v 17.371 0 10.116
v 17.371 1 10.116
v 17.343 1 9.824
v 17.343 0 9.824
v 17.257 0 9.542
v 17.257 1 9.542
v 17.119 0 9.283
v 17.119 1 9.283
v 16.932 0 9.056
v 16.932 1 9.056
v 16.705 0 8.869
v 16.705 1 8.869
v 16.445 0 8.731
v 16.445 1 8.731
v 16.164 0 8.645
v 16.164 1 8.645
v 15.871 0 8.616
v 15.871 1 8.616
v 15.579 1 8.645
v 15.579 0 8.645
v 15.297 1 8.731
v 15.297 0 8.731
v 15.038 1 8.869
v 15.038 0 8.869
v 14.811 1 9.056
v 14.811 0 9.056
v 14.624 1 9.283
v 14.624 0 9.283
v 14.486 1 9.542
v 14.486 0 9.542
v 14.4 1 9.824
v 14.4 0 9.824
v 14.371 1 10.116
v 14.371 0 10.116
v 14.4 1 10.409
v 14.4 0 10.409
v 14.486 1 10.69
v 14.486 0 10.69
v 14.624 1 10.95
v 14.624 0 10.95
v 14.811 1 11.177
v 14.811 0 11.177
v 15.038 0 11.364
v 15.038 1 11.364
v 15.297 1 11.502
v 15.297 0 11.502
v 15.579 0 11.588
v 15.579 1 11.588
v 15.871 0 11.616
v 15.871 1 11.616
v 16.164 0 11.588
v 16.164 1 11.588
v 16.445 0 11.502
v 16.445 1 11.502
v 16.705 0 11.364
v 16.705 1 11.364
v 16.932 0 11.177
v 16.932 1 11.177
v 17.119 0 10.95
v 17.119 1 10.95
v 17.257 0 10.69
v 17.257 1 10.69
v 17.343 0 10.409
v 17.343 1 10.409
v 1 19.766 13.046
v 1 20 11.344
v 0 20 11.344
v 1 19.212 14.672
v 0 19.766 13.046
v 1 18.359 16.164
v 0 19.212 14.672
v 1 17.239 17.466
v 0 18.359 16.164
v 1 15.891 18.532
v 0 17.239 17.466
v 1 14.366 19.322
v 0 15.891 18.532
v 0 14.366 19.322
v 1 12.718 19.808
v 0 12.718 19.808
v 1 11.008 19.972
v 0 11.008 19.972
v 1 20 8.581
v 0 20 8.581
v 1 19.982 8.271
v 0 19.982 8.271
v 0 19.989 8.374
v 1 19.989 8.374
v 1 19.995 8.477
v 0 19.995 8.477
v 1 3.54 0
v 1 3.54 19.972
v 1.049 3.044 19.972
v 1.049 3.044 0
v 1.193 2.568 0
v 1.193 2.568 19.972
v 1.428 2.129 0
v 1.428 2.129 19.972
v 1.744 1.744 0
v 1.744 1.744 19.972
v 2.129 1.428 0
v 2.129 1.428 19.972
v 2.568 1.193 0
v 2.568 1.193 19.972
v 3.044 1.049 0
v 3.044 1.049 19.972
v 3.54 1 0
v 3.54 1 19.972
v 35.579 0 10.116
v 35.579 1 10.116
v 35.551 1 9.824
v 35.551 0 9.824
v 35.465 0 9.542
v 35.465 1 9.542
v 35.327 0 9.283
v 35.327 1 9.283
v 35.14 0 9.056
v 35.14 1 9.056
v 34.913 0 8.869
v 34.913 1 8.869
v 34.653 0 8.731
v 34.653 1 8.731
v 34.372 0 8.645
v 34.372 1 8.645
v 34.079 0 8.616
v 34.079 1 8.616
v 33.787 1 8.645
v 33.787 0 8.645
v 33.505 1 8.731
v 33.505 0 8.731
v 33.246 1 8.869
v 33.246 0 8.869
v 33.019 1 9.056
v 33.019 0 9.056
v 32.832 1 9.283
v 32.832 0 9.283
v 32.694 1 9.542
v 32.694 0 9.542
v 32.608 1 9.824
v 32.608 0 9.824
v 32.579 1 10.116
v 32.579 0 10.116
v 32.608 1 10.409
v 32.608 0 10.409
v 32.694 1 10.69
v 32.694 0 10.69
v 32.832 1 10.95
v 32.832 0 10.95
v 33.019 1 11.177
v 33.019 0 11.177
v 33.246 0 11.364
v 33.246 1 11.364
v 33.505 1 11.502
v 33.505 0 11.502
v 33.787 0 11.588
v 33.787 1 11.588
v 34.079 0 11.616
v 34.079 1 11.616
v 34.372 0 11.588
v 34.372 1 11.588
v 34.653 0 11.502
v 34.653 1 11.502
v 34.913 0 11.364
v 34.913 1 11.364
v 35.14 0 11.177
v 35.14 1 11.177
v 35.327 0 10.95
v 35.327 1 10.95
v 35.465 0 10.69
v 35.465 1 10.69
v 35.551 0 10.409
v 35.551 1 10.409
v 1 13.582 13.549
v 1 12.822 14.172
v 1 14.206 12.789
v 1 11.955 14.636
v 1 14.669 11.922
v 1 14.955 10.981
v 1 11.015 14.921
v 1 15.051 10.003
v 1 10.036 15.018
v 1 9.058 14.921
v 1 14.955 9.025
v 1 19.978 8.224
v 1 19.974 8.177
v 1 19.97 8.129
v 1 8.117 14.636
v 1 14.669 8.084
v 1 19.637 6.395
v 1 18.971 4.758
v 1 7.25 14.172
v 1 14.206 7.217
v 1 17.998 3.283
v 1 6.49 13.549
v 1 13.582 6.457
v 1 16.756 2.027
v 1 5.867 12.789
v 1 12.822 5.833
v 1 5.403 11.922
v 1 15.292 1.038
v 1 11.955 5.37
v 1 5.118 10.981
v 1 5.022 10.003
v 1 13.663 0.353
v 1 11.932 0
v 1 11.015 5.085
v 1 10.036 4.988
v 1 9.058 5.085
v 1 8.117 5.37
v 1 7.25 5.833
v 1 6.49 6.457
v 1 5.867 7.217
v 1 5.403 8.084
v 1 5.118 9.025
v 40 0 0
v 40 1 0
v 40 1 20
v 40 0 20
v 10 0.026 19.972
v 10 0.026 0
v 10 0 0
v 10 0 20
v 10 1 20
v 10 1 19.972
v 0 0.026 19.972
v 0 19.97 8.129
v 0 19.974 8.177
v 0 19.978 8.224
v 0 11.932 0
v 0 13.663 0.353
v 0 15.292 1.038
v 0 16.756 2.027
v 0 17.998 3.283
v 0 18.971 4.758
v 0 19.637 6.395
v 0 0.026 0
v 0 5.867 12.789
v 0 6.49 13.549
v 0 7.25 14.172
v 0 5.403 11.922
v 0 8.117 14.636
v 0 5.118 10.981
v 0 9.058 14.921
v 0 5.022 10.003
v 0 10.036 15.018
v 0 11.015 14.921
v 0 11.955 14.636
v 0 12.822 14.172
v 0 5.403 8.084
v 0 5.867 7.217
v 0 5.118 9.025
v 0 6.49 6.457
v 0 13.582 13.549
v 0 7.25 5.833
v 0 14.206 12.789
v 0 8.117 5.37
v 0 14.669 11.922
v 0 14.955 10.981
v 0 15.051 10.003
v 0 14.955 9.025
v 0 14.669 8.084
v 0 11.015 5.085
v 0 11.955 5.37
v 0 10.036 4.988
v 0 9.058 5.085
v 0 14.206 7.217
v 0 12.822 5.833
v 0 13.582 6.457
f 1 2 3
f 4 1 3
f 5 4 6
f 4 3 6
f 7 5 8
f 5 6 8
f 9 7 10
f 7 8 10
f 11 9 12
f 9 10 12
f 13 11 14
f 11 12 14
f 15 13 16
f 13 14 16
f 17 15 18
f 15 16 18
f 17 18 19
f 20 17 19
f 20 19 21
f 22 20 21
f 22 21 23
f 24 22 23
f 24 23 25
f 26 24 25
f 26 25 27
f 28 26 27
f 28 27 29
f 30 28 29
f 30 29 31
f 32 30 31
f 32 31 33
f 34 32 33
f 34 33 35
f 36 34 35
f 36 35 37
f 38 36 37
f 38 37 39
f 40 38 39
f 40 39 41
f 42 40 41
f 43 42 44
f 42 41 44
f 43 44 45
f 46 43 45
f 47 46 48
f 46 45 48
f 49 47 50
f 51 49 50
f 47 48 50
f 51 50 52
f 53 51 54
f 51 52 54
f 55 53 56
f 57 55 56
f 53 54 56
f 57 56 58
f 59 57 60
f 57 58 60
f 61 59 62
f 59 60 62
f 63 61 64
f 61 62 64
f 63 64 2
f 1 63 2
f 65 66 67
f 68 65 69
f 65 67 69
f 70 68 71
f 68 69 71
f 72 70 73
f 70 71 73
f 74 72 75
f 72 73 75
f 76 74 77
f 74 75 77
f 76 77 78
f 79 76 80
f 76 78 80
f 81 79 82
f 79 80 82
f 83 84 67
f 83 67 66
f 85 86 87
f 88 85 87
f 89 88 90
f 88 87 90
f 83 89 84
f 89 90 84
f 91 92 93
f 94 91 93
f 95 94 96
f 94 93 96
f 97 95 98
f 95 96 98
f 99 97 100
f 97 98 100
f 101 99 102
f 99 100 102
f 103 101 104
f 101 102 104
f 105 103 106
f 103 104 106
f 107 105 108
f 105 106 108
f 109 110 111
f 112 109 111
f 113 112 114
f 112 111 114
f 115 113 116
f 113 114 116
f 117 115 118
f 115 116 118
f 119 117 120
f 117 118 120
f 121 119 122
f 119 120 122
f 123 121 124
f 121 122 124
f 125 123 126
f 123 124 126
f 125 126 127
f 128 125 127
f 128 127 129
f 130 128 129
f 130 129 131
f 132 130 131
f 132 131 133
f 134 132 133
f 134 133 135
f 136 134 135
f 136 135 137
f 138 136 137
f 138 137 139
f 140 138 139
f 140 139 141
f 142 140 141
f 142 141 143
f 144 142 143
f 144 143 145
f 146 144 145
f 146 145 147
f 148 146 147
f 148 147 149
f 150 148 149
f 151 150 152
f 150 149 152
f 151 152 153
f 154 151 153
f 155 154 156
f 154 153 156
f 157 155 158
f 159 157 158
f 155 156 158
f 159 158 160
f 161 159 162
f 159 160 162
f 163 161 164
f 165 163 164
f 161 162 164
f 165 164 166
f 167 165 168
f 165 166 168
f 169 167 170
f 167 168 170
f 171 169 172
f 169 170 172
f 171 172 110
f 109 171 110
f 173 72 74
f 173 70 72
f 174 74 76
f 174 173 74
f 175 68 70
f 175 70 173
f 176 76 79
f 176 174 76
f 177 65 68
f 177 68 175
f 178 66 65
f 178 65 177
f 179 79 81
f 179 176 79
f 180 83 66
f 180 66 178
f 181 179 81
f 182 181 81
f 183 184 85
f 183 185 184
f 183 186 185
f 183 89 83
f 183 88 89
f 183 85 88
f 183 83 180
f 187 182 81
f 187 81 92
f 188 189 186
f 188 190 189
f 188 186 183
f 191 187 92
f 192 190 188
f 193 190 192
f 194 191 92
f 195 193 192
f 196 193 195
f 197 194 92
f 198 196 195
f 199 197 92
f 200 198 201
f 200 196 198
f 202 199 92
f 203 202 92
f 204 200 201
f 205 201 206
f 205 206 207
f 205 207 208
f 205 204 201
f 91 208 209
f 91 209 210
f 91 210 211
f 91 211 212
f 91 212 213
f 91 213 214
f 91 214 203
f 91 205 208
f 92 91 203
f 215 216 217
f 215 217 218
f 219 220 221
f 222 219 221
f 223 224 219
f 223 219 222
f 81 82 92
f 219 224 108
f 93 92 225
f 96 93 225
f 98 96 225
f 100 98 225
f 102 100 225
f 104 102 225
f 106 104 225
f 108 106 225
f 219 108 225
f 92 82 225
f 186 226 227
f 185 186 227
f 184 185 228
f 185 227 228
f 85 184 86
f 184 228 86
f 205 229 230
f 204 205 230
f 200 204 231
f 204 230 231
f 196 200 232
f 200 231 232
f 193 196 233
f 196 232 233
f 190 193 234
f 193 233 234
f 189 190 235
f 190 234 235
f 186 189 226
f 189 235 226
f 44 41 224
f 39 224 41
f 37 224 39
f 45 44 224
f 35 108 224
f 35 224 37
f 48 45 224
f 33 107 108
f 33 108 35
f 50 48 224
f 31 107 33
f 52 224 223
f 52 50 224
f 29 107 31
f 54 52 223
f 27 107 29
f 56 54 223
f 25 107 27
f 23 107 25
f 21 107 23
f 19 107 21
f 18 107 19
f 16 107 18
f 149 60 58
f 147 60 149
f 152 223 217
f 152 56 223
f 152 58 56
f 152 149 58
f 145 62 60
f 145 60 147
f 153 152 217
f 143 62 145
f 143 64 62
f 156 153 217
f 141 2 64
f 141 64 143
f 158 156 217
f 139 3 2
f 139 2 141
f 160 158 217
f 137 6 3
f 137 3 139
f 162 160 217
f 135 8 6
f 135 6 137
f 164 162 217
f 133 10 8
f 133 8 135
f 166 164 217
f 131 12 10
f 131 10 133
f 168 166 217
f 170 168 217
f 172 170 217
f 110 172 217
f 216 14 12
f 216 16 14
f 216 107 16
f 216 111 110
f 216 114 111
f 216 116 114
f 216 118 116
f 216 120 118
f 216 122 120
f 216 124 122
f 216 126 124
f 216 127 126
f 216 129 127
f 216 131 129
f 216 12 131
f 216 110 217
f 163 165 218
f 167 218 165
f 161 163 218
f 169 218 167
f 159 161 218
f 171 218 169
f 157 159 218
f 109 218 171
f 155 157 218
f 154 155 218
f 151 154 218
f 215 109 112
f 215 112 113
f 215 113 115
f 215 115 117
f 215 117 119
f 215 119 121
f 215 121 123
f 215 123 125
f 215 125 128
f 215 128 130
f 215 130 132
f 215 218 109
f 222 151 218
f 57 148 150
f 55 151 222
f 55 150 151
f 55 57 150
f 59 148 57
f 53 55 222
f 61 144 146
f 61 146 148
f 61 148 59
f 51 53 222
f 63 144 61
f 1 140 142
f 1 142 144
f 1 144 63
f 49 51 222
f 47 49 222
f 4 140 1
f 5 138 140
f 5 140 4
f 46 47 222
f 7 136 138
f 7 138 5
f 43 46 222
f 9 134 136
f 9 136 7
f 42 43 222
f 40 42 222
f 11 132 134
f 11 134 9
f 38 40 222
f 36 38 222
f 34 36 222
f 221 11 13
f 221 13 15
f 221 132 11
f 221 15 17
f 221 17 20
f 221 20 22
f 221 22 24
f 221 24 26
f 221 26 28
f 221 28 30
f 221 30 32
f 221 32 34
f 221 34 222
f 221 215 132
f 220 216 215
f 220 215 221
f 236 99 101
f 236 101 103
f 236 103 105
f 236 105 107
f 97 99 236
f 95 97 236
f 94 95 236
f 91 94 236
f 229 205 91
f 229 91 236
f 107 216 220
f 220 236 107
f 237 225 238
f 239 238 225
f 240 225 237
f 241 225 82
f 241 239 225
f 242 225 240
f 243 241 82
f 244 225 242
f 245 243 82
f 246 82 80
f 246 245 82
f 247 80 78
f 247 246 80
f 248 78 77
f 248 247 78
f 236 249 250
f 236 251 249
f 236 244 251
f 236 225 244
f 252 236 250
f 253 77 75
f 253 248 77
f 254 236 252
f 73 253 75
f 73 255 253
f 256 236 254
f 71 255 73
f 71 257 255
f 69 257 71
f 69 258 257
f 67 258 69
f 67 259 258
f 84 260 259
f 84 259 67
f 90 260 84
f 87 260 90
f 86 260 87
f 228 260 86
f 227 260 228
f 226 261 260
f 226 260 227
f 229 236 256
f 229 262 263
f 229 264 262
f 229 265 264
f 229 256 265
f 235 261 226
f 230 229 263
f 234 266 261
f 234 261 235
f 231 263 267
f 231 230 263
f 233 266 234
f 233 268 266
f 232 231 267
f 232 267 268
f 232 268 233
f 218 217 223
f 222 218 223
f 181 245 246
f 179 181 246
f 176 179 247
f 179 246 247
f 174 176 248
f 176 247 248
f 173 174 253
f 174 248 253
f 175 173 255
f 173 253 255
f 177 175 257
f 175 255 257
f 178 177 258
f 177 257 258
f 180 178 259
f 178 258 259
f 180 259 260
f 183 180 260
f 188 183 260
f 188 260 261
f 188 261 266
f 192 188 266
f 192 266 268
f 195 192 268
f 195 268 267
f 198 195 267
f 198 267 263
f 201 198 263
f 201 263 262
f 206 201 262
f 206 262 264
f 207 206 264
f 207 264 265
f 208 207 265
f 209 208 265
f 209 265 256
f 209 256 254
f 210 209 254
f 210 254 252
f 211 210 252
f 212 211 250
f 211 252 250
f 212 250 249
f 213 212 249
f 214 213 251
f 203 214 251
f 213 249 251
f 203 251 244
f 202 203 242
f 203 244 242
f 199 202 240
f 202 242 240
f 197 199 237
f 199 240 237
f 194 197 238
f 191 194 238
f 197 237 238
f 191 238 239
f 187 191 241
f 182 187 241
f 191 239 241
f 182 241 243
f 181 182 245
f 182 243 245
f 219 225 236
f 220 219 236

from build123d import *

# Parameters (mm, degrees)
EXTRUDE1_DEPTH     = 20
FILLET1_R          = 2.54
SKETCH8_R          = 5.014710823
CUT_EXTRUDE2_DEPTH = 10
CUT_EXTRUDE5_DEPTH = 10
CUT_EXTRUDE6_DEPTH = 10
CUT_EXTRUDE7_DEPTH = 30


with BuildPart() as part:
    # Sketch1 → Extrude1 (new body)
    with BuildSketch(Plane.XY):
        Polygon((1, 20), (1, 1), (40, 1), (40, 0), (0, 0), (0, 20), align=None)
    extrude(amount=EXTRUDE1_DEPTH)

    # Fillet1
    fillet1_edges = [part.edges().sort_by_distance(p)[0] for p in [
        (1, 1, 10),
    ]]
    fillet(fillet1_edges, radius=FILLET1_R)

    # Sketch8 → Cut-Extrude2 (cut)
    with BuildSketch(Plane.ZY):
        with Locations((10.002916517, 10.036253446)):
            Circle(SKETCH8_R)
    extrude(amount=-CUT_EXTRUDE2_DEPTH, mode=Mode.SUBTRACT)

    # Sketch9 → Cut-Extrude5 (cut)
    with BuildSketch(Plane.ZY):
        with BuildLine():
            Line((20, 20), (11.343762255, 20))
            ThreePointArc((11.343762255, 20), (17.466219012, 17.238892052), (19.972229781, 11.007671958))
            Line((19.972229781, 11.007671958), (19.972229781, 0.025510204))
            Line((19.972229781, 0.025510204), (0, 0.025510204))
            Line((0, 0.025510204), (0, 0))
            Line((0, 0), (20, 0))
            Line((20, 0), (20, 12.992821057))
            Line((20, 12.992821057), (20, 20))
        make_face()
        with BuildLine():
            ThreePointArc((0, 11.932412977), (2.787525204, 17.564709397), (8.580833361, 20))
            Line((8.580833361, 20), (0, 20))
            Line((0, 20), (0, 11.932412977))
        make_face()
    extrude(amount=-CUT_EXTRUDE5_DEPTH, mode=Mode.SUBTRACT)

    # Sketch10 → Cut-Extrude6 (cut)
    with BuildSketch(Plane(origin=(0, 1, 0), x_dir=(1, 0, 0), z_dir=(0, 1, 0))):
        with BuildLine():
            ThreePointArc((17.371397646, -10.116419243), (14.371398672, -10.114665052), (17.371393543, -10.119927624))
            ThreePointArc((17.371393543, -10.119927624), (17.37139662, -10.118173435), (17.371397646, -10.116419243))
        make_face()
    extrude(amount=-CUT_EXTRUDE6_DEPTH, mode=Mode.SUBTRACT)

    # Sketch11 → Cut-Extrude7 (cut)
    with BuildSketch(Plane(origin=(0, 1, 0), x_dir=(1, 0, 0), z_dir=(0, 1, 0))):
        with BuildLine():
            ThreePointArc((32.579372789, -10.112355136), (34.077335228, -11.616417867), (35.579367283, -10.116419243))
            ThreePointArc((35.579367283, -10.116419243), (34.081399338, -8.61642062), (32.579372789, -10.112355136))
        make_face()
    extrude(amount=-CUT_EXTRUDE7_DEPTH, mode=Mode.SUBTRACT)


solid = part.part
